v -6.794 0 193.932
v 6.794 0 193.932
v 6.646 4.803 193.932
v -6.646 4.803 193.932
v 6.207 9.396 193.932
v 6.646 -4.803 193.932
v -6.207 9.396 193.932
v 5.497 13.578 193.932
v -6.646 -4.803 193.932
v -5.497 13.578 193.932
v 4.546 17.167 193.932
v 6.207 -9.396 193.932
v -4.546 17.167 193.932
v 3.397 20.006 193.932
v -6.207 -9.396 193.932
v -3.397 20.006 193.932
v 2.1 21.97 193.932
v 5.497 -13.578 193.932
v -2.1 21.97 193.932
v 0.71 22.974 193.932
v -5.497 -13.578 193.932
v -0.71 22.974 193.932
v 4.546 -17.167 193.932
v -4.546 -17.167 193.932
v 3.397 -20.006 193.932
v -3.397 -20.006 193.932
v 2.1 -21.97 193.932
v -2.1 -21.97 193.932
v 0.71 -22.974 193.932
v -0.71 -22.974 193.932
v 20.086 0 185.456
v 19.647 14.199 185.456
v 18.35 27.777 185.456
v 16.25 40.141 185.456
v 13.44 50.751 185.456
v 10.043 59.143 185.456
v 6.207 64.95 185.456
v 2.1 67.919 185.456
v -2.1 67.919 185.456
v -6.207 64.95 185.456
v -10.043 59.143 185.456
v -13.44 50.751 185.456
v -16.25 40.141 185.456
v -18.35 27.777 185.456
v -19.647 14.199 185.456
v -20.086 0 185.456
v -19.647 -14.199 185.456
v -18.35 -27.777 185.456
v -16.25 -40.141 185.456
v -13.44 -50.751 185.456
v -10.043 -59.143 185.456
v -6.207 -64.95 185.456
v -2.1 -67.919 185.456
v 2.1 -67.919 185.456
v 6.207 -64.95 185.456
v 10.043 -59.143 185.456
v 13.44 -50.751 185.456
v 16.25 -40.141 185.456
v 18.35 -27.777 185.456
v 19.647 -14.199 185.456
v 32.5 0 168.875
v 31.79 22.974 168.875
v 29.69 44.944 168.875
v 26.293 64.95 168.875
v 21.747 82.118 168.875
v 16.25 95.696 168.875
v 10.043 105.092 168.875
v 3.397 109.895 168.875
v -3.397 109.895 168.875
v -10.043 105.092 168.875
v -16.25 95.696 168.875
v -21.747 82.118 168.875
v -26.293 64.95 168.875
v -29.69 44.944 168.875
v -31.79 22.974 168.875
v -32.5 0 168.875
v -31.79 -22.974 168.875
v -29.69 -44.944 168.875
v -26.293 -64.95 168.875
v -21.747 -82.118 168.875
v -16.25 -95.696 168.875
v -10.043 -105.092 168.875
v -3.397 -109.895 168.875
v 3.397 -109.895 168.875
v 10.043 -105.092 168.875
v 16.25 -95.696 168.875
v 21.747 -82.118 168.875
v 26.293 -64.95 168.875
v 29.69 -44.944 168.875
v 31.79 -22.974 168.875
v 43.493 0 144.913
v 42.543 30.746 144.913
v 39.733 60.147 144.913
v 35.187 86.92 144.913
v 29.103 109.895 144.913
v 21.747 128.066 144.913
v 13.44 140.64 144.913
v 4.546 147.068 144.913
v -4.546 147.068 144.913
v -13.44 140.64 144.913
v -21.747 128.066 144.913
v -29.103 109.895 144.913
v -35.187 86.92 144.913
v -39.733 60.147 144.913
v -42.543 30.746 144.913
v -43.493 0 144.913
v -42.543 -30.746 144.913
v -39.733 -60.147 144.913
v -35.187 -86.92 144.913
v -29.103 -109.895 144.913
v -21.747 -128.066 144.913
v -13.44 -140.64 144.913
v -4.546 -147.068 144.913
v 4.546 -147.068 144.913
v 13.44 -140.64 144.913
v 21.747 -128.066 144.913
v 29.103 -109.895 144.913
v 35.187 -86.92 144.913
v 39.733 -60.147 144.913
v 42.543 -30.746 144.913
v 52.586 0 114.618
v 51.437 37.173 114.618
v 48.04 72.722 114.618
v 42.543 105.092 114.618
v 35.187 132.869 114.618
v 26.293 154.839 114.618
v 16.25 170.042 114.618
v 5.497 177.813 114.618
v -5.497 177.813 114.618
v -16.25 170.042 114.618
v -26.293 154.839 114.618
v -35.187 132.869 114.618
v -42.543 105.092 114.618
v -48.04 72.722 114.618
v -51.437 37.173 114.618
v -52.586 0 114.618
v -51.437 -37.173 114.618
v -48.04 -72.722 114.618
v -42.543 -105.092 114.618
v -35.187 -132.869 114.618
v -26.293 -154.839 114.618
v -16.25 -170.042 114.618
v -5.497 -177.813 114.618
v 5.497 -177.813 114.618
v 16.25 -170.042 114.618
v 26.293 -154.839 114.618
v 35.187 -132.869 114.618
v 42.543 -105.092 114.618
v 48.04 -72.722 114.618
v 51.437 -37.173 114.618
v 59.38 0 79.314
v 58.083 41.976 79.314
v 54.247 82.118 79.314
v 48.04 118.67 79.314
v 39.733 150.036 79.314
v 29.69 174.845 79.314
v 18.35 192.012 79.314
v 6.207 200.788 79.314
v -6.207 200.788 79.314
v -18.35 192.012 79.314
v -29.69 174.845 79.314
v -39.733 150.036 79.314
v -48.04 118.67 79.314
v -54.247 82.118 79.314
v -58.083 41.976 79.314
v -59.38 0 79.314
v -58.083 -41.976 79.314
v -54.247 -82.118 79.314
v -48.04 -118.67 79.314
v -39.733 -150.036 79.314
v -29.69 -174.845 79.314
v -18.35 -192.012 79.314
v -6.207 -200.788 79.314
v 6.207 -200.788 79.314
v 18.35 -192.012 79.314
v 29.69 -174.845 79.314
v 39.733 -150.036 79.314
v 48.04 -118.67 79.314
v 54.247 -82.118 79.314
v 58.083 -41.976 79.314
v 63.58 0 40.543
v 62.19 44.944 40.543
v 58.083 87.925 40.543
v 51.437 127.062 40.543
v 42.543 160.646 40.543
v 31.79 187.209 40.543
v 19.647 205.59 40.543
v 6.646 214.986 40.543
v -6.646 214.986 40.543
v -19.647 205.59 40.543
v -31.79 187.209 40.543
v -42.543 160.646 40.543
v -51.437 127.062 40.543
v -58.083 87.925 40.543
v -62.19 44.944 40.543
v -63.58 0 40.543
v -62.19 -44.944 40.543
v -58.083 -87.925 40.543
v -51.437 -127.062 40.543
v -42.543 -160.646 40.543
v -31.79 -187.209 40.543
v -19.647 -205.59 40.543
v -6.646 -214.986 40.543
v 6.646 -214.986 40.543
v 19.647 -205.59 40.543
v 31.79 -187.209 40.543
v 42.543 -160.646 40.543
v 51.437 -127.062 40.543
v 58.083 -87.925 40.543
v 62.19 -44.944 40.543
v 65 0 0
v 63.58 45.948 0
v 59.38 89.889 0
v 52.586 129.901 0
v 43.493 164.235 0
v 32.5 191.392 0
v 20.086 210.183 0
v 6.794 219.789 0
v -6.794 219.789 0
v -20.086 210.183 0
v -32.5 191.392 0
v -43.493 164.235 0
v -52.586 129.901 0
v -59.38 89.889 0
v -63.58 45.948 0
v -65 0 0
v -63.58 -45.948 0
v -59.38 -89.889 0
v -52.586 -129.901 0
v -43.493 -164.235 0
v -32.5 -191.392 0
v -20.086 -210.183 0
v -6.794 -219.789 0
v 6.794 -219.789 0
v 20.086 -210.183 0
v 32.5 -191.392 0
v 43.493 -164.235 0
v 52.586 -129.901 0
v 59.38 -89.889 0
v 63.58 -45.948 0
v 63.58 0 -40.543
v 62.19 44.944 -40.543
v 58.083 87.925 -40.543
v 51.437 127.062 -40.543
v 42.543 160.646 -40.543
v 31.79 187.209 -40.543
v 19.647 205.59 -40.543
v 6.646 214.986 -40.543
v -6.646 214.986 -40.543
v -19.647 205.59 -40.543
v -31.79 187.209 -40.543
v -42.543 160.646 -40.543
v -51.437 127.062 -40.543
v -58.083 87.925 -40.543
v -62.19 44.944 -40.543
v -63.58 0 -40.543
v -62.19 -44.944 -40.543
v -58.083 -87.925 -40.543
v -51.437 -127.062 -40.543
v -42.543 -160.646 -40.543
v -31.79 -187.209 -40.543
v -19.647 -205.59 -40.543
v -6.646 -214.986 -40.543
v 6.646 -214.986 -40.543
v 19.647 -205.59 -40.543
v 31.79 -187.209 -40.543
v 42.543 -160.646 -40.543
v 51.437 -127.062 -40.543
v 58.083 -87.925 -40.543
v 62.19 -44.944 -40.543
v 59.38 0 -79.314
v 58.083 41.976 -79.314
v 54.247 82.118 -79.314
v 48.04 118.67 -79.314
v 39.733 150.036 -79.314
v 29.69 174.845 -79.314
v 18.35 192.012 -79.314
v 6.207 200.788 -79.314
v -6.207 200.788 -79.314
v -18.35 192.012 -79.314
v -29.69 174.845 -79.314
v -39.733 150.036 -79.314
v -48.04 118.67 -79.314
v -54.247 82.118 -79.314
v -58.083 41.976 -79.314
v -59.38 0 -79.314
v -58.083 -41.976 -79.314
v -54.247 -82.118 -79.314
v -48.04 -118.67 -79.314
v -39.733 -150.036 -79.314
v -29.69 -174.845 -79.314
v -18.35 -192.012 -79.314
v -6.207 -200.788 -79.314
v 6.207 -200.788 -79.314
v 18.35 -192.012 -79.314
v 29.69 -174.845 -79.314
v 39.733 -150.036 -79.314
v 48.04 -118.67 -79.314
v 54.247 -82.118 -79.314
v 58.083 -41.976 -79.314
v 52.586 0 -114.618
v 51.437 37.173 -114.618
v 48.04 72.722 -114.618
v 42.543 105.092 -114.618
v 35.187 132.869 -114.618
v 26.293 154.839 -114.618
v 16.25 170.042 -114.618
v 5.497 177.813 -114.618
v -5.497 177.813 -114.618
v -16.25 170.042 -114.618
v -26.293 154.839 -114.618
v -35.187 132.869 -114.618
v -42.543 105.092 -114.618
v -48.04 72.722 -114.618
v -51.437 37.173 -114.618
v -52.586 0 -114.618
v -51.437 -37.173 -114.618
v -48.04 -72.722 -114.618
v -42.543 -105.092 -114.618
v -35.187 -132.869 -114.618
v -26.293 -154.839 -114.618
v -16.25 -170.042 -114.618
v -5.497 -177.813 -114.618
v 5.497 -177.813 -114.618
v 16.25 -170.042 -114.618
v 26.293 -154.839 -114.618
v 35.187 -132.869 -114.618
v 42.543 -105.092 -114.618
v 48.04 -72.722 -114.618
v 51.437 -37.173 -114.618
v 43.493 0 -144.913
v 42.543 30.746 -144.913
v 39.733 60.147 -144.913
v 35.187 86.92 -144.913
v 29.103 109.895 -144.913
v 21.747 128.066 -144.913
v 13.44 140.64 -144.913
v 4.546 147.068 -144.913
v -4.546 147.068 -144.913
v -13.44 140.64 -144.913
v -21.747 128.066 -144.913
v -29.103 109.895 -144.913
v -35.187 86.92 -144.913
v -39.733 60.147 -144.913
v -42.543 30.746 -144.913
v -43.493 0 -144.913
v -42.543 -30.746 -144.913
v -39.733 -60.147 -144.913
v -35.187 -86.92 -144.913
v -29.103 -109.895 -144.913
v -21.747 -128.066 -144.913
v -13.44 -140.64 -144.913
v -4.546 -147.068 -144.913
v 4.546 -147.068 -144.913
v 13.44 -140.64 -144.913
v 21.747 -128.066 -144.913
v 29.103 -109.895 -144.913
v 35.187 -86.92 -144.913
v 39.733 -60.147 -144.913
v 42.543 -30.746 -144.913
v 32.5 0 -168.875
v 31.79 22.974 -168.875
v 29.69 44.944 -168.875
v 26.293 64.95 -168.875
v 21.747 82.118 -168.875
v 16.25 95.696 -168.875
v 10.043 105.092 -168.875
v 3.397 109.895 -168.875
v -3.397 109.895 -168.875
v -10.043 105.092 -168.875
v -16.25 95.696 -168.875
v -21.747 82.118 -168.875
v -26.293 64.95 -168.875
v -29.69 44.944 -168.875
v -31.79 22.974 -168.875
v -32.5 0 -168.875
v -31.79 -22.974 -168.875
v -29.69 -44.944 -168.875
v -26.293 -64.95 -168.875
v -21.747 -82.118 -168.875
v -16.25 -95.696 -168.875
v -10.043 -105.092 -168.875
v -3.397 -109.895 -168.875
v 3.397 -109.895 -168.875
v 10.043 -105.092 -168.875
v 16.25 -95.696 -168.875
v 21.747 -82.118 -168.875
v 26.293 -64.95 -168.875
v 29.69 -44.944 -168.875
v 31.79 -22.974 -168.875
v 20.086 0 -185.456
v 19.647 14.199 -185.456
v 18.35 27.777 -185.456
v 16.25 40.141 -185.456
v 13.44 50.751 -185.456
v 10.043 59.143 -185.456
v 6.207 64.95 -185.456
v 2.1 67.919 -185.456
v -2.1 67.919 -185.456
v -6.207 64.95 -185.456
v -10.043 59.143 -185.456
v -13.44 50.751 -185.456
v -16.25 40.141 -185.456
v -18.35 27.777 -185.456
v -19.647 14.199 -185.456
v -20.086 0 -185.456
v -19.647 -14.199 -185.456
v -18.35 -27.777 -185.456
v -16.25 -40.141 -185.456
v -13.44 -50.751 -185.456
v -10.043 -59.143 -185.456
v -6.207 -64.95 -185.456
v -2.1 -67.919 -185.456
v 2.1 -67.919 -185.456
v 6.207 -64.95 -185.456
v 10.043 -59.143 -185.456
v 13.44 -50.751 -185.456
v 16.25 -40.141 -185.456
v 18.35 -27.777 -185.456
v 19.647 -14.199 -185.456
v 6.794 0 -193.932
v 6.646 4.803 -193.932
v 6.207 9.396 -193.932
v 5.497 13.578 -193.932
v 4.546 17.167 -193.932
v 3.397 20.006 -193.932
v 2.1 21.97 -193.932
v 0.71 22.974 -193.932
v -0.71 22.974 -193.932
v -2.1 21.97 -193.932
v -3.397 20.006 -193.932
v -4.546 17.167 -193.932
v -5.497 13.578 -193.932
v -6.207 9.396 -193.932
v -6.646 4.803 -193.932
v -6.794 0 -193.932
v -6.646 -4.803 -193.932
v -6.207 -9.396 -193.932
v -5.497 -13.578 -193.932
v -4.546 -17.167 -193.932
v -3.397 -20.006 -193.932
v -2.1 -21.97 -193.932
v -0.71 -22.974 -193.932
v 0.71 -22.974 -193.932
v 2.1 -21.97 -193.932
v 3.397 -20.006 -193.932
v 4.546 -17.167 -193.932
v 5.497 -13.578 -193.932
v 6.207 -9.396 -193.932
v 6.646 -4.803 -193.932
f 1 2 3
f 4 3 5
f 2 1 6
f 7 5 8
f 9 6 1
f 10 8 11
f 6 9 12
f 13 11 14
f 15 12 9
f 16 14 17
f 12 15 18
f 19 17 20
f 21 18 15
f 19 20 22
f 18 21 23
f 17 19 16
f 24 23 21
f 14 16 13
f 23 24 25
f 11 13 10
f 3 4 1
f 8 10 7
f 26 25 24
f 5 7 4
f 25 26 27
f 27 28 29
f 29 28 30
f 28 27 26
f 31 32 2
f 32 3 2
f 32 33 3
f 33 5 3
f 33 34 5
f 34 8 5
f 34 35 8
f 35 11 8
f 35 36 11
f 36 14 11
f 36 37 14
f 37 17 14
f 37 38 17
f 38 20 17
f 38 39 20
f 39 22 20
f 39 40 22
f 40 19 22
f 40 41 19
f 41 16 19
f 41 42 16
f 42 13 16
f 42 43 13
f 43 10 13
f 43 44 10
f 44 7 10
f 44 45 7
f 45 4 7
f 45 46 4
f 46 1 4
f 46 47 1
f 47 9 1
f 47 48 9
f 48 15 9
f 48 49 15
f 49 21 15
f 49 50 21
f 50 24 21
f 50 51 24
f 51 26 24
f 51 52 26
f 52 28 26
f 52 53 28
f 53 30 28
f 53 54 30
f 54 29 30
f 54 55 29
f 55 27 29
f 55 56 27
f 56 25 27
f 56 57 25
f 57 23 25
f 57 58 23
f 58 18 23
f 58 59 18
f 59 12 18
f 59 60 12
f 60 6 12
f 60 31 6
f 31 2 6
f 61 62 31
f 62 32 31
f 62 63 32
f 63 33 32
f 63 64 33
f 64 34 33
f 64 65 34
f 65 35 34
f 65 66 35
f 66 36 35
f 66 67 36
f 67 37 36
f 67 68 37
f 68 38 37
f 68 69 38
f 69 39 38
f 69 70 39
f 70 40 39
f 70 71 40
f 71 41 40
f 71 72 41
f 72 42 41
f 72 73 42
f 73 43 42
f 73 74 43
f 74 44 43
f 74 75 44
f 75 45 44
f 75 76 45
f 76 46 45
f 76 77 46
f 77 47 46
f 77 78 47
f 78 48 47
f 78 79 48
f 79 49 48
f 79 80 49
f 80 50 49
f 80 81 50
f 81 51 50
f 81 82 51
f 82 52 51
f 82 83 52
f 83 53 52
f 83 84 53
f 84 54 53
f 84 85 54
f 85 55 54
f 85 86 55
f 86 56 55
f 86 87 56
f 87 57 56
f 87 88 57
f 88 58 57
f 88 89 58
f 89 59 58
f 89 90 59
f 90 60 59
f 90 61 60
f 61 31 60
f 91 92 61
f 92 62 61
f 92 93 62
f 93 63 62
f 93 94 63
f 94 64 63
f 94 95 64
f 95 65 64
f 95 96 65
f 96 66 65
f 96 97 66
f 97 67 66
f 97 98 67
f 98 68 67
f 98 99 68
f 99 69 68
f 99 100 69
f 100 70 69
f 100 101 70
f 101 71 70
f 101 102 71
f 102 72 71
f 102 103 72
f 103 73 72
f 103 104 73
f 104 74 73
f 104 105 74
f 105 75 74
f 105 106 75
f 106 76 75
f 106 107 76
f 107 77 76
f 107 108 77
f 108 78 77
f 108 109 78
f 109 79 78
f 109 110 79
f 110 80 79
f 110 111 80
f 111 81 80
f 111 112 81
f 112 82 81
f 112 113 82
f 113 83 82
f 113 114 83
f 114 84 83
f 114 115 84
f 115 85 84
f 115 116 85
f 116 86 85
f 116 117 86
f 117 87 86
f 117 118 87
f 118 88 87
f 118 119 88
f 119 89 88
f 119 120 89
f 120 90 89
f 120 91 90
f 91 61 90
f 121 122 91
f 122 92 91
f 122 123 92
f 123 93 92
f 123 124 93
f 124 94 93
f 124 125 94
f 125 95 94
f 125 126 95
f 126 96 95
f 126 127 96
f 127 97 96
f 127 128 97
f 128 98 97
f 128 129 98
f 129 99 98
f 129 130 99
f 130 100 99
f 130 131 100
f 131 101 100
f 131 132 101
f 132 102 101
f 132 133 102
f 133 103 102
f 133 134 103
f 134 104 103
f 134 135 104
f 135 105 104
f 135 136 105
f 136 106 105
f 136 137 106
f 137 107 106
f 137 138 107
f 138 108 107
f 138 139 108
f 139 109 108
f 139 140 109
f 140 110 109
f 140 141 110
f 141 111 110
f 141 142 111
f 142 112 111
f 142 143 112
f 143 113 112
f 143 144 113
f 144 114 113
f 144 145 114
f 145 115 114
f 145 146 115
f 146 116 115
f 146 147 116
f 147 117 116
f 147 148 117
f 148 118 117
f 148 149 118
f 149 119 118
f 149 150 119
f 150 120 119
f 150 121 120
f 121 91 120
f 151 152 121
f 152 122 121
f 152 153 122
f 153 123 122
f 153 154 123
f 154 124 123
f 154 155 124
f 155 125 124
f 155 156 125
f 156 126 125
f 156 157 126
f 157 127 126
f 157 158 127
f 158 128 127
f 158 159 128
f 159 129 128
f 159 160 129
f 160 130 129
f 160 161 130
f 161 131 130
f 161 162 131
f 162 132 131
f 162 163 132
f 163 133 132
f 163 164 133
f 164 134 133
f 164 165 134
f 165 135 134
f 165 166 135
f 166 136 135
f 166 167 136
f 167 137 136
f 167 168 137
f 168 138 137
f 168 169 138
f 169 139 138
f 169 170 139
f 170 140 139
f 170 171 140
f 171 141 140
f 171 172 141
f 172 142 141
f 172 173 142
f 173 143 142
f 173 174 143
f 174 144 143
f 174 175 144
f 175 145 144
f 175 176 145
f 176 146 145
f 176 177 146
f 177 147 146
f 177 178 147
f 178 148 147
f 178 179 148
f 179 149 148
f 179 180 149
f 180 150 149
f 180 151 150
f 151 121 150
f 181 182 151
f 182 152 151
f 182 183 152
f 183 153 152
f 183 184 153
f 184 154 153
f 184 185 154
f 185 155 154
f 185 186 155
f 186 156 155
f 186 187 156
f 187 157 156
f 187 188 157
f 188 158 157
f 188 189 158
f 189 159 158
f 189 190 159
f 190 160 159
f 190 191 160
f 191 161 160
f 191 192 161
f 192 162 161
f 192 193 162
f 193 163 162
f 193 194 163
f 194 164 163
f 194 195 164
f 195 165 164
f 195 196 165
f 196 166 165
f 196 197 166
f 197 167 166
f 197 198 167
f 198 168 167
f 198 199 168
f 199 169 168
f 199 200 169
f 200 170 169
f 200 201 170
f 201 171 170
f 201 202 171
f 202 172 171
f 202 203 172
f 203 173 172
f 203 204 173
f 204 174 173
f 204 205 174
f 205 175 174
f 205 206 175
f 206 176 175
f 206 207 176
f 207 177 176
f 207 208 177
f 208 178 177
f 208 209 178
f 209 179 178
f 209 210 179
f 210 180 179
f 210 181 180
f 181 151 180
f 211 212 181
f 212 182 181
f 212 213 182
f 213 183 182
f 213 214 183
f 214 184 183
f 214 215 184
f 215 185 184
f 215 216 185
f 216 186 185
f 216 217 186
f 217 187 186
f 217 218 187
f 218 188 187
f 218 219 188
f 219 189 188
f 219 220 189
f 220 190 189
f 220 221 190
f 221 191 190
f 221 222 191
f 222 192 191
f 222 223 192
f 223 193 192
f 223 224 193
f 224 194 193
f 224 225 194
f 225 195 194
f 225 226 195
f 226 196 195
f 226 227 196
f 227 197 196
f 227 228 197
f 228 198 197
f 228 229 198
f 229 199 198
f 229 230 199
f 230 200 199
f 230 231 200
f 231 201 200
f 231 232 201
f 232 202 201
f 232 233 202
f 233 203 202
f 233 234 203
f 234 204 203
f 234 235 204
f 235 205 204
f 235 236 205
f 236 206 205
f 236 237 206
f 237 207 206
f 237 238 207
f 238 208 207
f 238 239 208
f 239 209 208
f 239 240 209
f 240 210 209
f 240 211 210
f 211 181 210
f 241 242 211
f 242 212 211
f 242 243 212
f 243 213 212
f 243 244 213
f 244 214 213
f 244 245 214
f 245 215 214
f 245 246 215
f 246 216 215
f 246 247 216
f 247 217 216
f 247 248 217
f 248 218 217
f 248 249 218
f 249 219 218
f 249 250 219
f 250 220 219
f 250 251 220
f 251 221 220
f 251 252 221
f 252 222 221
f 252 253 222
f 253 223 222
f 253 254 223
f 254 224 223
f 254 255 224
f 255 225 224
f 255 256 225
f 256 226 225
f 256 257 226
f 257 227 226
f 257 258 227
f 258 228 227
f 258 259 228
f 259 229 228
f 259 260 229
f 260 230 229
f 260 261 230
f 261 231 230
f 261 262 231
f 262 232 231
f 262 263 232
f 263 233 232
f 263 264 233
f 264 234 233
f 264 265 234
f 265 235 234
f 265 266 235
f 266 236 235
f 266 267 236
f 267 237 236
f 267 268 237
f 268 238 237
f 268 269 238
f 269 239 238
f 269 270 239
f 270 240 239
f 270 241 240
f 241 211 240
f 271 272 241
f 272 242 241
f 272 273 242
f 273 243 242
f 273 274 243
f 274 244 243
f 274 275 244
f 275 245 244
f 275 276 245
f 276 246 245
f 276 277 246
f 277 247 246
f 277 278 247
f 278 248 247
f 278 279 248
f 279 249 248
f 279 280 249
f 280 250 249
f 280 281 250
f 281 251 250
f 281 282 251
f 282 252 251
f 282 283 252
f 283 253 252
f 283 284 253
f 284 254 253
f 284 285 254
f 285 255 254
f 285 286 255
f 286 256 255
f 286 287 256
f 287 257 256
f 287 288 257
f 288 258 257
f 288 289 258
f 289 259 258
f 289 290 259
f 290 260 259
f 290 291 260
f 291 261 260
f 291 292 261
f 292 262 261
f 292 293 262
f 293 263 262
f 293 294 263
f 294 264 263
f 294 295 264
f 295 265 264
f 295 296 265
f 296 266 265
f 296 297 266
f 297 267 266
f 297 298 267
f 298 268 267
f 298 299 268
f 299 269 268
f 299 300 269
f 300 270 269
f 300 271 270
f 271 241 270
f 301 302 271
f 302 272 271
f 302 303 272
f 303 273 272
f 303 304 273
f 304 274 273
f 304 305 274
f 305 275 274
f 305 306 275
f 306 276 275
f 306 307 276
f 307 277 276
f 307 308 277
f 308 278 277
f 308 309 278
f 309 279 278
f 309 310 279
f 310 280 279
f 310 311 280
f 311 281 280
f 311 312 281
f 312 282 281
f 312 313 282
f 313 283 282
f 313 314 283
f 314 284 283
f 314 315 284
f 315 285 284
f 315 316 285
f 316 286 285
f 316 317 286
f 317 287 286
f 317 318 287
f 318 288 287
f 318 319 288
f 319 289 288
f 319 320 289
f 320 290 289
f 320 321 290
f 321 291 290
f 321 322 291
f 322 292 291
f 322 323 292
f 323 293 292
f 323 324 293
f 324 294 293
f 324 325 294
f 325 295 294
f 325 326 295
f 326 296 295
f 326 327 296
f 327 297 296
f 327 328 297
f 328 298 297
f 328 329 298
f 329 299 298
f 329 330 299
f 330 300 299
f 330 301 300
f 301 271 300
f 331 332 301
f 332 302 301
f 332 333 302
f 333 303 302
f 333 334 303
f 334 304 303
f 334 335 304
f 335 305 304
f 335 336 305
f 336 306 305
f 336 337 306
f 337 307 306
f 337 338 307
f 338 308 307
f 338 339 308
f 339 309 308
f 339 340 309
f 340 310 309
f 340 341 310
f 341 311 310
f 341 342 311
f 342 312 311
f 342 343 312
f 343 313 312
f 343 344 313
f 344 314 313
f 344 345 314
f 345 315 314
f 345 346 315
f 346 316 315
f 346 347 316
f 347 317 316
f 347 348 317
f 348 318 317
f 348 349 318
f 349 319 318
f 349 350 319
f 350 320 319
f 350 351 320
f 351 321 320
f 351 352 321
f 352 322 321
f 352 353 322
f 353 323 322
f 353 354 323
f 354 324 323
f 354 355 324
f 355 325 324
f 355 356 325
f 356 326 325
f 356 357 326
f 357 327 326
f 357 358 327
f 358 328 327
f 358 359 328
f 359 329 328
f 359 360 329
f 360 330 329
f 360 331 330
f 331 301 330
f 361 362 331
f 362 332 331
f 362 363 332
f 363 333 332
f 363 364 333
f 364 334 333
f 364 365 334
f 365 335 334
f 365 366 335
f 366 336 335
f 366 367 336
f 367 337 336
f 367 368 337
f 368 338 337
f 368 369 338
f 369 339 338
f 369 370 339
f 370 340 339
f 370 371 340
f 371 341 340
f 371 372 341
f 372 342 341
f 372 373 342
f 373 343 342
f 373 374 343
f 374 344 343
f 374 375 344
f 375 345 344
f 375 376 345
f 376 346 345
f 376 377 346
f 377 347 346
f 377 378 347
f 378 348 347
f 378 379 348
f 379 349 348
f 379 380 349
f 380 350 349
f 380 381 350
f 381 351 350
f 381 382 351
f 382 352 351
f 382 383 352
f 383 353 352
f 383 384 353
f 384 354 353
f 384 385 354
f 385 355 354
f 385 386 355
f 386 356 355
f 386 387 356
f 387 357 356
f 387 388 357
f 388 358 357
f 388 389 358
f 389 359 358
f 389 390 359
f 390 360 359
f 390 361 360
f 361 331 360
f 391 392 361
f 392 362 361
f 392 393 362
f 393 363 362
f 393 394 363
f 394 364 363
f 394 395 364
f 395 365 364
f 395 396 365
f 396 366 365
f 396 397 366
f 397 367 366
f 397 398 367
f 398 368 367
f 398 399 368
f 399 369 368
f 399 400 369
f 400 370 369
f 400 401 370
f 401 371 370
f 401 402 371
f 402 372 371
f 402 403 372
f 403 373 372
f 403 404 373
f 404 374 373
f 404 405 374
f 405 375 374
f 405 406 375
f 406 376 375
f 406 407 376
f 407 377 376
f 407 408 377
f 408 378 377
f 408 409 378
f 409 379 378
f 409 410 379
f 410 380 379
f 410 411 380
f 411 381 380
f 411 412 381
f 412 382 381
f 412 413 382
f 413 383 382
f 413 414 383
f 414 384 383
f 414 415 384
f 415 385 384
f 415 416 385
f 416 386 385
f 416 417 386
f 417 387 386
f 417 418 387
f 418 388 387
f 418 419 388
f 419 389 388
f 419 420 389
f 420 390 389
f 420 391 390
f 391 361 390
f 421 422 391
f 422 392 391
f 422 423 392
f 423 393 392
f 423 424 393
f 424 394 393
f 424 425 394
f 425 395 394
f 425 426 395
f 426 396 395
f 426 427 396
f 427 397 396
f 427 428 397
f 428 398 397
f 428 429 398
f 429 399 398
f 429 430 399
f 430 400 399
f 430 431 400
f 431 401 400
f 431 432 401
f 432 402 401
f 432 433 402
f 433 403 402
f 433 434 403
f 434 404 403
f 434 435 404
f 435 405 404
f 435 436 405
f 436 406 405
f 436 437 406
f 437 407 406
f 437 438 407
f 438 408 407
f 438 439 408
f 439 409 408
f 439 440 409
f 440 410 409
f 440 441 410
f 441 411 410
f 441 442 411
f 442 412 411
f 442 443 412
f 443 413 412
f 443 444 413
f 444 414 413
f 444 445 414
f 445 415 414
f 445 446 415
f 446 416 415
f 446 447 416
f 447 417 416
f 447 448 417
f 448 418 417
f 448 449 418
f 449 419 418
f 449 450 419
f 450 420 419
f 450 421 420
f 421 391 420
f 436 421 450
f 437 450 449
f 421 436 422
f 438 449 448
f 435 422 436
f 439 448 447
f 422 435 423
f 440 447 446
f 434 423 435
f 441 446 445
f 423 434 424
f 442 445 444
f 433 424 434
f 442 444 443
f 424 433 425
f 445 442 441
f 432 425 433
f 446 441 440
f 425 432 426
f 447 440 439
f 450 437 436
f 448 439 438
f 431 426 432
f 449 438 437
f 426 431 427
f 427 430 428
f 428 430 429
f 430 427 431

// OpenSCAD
// Generated by SolidPython 1.0.1 on 2020-07-29 00:46:47


scale(v = [5, 17, 15]) {
	sphere(r = 13);
}
/***********************************************
*********      SolidPython code:      **********
************************************************
 
# import packages: SolidPython
from solid import *
from solid.utils import *
from itertools import chain, combinations, permutations


class Resize:

    def __init__(self, scad_file):
        self.scad_file = scad_file
        #self.scad_file = import_scad(scad_file)
        # cone/cylinder param:
        self.r1 = 0
        self.r2 = 0
        self.h = 0
        # rectangular prism param:
        self.w = 0
        self.l = 0
        # ellipse param:
        self.r = 0

    # import OpenScad code (file name corresponds to shape)


    # classify shape + parameters
    def assign(self, param1, param2, param3):
        if self.scad_file == 'cone.scad':
            self.r1 = param1
            self.r2 = param2
            self.h = param3
        elif self.scad_file == 'cylinder.scad':
            self.r1 = param1
            self.r2 = param2
            self.h = param3
        elif self.scad_file == 'rectangularPrism.scad':
            self.h = param1
            self.l = param2
            self.w = param3
        else:
            self.r = param1
            self.h = param2

    # resize parameters
    def iterate(self):
        x = range(3, 20, 2)
        i = 1
        if self.scad_file == 'cone.scad':
            tempList = list(permutations(x, 2))
            for temp in tempList:
                param1 = temp[0]
                param2 = temp[1]
                filepath = 'produced_scad_files/' + 'cone' + str(param1) + '_' + str(param2) + '_' + '.scad'
                scad_render_to_file(cylinder(h=param1, r1=param2, r2=0), filepath)

        elif self.scad_file == 'cylinder.scad':
            tempList = list(permutations(x, 3))
            for temp in tempList:
                param1 = temp[0]
                param2 = temp[1]
                filepath = 'produced_scad_files/' + 'cylinder' + str(param1) + '_' + str(param2) + '_' + '.scad'
                scad_render_to_file(cylinder(h=param1, r1=param2, r2=param2), filepath)

        elif self.scad_file == 'rectangularPrism.scad':
            tempList = list(permutations(x, 3))
            for temp in tempList:
                param1 = temp[0]
                param2 = temp[1]
                param3 = temp[2]
                filepath = 'produced_scad_files/' + 'rectangularPrism' + str(param1) + '_' + str(param2) + '_' + str(
                    param3) + '.scad'
                scad_render_to_file(cube(size=(param1, param2, param3)), filepath)

        elif self.scad_file == 'ellipse.scad':
            tempList = list(permutations(x, 4))
            for temp in tempList:
                param1 = temp[0]
                param2 = temp[1]
                param3 = temp[2]
                param4 = temp[3]
                filepath = 'produced_scad_files/' + 'ellipse' + str(param1) + '_' + str(param2) + '_' + str(param3) + '_' + str(param4) + '.scad'
                scad_render_to_file(scale([param1, param2, param3])(sphere(r=param4)), filepath)

    def render_to_scadfile(self):
        scad_render_to_file(scad, 'example.scad') 
 
************************************************/
